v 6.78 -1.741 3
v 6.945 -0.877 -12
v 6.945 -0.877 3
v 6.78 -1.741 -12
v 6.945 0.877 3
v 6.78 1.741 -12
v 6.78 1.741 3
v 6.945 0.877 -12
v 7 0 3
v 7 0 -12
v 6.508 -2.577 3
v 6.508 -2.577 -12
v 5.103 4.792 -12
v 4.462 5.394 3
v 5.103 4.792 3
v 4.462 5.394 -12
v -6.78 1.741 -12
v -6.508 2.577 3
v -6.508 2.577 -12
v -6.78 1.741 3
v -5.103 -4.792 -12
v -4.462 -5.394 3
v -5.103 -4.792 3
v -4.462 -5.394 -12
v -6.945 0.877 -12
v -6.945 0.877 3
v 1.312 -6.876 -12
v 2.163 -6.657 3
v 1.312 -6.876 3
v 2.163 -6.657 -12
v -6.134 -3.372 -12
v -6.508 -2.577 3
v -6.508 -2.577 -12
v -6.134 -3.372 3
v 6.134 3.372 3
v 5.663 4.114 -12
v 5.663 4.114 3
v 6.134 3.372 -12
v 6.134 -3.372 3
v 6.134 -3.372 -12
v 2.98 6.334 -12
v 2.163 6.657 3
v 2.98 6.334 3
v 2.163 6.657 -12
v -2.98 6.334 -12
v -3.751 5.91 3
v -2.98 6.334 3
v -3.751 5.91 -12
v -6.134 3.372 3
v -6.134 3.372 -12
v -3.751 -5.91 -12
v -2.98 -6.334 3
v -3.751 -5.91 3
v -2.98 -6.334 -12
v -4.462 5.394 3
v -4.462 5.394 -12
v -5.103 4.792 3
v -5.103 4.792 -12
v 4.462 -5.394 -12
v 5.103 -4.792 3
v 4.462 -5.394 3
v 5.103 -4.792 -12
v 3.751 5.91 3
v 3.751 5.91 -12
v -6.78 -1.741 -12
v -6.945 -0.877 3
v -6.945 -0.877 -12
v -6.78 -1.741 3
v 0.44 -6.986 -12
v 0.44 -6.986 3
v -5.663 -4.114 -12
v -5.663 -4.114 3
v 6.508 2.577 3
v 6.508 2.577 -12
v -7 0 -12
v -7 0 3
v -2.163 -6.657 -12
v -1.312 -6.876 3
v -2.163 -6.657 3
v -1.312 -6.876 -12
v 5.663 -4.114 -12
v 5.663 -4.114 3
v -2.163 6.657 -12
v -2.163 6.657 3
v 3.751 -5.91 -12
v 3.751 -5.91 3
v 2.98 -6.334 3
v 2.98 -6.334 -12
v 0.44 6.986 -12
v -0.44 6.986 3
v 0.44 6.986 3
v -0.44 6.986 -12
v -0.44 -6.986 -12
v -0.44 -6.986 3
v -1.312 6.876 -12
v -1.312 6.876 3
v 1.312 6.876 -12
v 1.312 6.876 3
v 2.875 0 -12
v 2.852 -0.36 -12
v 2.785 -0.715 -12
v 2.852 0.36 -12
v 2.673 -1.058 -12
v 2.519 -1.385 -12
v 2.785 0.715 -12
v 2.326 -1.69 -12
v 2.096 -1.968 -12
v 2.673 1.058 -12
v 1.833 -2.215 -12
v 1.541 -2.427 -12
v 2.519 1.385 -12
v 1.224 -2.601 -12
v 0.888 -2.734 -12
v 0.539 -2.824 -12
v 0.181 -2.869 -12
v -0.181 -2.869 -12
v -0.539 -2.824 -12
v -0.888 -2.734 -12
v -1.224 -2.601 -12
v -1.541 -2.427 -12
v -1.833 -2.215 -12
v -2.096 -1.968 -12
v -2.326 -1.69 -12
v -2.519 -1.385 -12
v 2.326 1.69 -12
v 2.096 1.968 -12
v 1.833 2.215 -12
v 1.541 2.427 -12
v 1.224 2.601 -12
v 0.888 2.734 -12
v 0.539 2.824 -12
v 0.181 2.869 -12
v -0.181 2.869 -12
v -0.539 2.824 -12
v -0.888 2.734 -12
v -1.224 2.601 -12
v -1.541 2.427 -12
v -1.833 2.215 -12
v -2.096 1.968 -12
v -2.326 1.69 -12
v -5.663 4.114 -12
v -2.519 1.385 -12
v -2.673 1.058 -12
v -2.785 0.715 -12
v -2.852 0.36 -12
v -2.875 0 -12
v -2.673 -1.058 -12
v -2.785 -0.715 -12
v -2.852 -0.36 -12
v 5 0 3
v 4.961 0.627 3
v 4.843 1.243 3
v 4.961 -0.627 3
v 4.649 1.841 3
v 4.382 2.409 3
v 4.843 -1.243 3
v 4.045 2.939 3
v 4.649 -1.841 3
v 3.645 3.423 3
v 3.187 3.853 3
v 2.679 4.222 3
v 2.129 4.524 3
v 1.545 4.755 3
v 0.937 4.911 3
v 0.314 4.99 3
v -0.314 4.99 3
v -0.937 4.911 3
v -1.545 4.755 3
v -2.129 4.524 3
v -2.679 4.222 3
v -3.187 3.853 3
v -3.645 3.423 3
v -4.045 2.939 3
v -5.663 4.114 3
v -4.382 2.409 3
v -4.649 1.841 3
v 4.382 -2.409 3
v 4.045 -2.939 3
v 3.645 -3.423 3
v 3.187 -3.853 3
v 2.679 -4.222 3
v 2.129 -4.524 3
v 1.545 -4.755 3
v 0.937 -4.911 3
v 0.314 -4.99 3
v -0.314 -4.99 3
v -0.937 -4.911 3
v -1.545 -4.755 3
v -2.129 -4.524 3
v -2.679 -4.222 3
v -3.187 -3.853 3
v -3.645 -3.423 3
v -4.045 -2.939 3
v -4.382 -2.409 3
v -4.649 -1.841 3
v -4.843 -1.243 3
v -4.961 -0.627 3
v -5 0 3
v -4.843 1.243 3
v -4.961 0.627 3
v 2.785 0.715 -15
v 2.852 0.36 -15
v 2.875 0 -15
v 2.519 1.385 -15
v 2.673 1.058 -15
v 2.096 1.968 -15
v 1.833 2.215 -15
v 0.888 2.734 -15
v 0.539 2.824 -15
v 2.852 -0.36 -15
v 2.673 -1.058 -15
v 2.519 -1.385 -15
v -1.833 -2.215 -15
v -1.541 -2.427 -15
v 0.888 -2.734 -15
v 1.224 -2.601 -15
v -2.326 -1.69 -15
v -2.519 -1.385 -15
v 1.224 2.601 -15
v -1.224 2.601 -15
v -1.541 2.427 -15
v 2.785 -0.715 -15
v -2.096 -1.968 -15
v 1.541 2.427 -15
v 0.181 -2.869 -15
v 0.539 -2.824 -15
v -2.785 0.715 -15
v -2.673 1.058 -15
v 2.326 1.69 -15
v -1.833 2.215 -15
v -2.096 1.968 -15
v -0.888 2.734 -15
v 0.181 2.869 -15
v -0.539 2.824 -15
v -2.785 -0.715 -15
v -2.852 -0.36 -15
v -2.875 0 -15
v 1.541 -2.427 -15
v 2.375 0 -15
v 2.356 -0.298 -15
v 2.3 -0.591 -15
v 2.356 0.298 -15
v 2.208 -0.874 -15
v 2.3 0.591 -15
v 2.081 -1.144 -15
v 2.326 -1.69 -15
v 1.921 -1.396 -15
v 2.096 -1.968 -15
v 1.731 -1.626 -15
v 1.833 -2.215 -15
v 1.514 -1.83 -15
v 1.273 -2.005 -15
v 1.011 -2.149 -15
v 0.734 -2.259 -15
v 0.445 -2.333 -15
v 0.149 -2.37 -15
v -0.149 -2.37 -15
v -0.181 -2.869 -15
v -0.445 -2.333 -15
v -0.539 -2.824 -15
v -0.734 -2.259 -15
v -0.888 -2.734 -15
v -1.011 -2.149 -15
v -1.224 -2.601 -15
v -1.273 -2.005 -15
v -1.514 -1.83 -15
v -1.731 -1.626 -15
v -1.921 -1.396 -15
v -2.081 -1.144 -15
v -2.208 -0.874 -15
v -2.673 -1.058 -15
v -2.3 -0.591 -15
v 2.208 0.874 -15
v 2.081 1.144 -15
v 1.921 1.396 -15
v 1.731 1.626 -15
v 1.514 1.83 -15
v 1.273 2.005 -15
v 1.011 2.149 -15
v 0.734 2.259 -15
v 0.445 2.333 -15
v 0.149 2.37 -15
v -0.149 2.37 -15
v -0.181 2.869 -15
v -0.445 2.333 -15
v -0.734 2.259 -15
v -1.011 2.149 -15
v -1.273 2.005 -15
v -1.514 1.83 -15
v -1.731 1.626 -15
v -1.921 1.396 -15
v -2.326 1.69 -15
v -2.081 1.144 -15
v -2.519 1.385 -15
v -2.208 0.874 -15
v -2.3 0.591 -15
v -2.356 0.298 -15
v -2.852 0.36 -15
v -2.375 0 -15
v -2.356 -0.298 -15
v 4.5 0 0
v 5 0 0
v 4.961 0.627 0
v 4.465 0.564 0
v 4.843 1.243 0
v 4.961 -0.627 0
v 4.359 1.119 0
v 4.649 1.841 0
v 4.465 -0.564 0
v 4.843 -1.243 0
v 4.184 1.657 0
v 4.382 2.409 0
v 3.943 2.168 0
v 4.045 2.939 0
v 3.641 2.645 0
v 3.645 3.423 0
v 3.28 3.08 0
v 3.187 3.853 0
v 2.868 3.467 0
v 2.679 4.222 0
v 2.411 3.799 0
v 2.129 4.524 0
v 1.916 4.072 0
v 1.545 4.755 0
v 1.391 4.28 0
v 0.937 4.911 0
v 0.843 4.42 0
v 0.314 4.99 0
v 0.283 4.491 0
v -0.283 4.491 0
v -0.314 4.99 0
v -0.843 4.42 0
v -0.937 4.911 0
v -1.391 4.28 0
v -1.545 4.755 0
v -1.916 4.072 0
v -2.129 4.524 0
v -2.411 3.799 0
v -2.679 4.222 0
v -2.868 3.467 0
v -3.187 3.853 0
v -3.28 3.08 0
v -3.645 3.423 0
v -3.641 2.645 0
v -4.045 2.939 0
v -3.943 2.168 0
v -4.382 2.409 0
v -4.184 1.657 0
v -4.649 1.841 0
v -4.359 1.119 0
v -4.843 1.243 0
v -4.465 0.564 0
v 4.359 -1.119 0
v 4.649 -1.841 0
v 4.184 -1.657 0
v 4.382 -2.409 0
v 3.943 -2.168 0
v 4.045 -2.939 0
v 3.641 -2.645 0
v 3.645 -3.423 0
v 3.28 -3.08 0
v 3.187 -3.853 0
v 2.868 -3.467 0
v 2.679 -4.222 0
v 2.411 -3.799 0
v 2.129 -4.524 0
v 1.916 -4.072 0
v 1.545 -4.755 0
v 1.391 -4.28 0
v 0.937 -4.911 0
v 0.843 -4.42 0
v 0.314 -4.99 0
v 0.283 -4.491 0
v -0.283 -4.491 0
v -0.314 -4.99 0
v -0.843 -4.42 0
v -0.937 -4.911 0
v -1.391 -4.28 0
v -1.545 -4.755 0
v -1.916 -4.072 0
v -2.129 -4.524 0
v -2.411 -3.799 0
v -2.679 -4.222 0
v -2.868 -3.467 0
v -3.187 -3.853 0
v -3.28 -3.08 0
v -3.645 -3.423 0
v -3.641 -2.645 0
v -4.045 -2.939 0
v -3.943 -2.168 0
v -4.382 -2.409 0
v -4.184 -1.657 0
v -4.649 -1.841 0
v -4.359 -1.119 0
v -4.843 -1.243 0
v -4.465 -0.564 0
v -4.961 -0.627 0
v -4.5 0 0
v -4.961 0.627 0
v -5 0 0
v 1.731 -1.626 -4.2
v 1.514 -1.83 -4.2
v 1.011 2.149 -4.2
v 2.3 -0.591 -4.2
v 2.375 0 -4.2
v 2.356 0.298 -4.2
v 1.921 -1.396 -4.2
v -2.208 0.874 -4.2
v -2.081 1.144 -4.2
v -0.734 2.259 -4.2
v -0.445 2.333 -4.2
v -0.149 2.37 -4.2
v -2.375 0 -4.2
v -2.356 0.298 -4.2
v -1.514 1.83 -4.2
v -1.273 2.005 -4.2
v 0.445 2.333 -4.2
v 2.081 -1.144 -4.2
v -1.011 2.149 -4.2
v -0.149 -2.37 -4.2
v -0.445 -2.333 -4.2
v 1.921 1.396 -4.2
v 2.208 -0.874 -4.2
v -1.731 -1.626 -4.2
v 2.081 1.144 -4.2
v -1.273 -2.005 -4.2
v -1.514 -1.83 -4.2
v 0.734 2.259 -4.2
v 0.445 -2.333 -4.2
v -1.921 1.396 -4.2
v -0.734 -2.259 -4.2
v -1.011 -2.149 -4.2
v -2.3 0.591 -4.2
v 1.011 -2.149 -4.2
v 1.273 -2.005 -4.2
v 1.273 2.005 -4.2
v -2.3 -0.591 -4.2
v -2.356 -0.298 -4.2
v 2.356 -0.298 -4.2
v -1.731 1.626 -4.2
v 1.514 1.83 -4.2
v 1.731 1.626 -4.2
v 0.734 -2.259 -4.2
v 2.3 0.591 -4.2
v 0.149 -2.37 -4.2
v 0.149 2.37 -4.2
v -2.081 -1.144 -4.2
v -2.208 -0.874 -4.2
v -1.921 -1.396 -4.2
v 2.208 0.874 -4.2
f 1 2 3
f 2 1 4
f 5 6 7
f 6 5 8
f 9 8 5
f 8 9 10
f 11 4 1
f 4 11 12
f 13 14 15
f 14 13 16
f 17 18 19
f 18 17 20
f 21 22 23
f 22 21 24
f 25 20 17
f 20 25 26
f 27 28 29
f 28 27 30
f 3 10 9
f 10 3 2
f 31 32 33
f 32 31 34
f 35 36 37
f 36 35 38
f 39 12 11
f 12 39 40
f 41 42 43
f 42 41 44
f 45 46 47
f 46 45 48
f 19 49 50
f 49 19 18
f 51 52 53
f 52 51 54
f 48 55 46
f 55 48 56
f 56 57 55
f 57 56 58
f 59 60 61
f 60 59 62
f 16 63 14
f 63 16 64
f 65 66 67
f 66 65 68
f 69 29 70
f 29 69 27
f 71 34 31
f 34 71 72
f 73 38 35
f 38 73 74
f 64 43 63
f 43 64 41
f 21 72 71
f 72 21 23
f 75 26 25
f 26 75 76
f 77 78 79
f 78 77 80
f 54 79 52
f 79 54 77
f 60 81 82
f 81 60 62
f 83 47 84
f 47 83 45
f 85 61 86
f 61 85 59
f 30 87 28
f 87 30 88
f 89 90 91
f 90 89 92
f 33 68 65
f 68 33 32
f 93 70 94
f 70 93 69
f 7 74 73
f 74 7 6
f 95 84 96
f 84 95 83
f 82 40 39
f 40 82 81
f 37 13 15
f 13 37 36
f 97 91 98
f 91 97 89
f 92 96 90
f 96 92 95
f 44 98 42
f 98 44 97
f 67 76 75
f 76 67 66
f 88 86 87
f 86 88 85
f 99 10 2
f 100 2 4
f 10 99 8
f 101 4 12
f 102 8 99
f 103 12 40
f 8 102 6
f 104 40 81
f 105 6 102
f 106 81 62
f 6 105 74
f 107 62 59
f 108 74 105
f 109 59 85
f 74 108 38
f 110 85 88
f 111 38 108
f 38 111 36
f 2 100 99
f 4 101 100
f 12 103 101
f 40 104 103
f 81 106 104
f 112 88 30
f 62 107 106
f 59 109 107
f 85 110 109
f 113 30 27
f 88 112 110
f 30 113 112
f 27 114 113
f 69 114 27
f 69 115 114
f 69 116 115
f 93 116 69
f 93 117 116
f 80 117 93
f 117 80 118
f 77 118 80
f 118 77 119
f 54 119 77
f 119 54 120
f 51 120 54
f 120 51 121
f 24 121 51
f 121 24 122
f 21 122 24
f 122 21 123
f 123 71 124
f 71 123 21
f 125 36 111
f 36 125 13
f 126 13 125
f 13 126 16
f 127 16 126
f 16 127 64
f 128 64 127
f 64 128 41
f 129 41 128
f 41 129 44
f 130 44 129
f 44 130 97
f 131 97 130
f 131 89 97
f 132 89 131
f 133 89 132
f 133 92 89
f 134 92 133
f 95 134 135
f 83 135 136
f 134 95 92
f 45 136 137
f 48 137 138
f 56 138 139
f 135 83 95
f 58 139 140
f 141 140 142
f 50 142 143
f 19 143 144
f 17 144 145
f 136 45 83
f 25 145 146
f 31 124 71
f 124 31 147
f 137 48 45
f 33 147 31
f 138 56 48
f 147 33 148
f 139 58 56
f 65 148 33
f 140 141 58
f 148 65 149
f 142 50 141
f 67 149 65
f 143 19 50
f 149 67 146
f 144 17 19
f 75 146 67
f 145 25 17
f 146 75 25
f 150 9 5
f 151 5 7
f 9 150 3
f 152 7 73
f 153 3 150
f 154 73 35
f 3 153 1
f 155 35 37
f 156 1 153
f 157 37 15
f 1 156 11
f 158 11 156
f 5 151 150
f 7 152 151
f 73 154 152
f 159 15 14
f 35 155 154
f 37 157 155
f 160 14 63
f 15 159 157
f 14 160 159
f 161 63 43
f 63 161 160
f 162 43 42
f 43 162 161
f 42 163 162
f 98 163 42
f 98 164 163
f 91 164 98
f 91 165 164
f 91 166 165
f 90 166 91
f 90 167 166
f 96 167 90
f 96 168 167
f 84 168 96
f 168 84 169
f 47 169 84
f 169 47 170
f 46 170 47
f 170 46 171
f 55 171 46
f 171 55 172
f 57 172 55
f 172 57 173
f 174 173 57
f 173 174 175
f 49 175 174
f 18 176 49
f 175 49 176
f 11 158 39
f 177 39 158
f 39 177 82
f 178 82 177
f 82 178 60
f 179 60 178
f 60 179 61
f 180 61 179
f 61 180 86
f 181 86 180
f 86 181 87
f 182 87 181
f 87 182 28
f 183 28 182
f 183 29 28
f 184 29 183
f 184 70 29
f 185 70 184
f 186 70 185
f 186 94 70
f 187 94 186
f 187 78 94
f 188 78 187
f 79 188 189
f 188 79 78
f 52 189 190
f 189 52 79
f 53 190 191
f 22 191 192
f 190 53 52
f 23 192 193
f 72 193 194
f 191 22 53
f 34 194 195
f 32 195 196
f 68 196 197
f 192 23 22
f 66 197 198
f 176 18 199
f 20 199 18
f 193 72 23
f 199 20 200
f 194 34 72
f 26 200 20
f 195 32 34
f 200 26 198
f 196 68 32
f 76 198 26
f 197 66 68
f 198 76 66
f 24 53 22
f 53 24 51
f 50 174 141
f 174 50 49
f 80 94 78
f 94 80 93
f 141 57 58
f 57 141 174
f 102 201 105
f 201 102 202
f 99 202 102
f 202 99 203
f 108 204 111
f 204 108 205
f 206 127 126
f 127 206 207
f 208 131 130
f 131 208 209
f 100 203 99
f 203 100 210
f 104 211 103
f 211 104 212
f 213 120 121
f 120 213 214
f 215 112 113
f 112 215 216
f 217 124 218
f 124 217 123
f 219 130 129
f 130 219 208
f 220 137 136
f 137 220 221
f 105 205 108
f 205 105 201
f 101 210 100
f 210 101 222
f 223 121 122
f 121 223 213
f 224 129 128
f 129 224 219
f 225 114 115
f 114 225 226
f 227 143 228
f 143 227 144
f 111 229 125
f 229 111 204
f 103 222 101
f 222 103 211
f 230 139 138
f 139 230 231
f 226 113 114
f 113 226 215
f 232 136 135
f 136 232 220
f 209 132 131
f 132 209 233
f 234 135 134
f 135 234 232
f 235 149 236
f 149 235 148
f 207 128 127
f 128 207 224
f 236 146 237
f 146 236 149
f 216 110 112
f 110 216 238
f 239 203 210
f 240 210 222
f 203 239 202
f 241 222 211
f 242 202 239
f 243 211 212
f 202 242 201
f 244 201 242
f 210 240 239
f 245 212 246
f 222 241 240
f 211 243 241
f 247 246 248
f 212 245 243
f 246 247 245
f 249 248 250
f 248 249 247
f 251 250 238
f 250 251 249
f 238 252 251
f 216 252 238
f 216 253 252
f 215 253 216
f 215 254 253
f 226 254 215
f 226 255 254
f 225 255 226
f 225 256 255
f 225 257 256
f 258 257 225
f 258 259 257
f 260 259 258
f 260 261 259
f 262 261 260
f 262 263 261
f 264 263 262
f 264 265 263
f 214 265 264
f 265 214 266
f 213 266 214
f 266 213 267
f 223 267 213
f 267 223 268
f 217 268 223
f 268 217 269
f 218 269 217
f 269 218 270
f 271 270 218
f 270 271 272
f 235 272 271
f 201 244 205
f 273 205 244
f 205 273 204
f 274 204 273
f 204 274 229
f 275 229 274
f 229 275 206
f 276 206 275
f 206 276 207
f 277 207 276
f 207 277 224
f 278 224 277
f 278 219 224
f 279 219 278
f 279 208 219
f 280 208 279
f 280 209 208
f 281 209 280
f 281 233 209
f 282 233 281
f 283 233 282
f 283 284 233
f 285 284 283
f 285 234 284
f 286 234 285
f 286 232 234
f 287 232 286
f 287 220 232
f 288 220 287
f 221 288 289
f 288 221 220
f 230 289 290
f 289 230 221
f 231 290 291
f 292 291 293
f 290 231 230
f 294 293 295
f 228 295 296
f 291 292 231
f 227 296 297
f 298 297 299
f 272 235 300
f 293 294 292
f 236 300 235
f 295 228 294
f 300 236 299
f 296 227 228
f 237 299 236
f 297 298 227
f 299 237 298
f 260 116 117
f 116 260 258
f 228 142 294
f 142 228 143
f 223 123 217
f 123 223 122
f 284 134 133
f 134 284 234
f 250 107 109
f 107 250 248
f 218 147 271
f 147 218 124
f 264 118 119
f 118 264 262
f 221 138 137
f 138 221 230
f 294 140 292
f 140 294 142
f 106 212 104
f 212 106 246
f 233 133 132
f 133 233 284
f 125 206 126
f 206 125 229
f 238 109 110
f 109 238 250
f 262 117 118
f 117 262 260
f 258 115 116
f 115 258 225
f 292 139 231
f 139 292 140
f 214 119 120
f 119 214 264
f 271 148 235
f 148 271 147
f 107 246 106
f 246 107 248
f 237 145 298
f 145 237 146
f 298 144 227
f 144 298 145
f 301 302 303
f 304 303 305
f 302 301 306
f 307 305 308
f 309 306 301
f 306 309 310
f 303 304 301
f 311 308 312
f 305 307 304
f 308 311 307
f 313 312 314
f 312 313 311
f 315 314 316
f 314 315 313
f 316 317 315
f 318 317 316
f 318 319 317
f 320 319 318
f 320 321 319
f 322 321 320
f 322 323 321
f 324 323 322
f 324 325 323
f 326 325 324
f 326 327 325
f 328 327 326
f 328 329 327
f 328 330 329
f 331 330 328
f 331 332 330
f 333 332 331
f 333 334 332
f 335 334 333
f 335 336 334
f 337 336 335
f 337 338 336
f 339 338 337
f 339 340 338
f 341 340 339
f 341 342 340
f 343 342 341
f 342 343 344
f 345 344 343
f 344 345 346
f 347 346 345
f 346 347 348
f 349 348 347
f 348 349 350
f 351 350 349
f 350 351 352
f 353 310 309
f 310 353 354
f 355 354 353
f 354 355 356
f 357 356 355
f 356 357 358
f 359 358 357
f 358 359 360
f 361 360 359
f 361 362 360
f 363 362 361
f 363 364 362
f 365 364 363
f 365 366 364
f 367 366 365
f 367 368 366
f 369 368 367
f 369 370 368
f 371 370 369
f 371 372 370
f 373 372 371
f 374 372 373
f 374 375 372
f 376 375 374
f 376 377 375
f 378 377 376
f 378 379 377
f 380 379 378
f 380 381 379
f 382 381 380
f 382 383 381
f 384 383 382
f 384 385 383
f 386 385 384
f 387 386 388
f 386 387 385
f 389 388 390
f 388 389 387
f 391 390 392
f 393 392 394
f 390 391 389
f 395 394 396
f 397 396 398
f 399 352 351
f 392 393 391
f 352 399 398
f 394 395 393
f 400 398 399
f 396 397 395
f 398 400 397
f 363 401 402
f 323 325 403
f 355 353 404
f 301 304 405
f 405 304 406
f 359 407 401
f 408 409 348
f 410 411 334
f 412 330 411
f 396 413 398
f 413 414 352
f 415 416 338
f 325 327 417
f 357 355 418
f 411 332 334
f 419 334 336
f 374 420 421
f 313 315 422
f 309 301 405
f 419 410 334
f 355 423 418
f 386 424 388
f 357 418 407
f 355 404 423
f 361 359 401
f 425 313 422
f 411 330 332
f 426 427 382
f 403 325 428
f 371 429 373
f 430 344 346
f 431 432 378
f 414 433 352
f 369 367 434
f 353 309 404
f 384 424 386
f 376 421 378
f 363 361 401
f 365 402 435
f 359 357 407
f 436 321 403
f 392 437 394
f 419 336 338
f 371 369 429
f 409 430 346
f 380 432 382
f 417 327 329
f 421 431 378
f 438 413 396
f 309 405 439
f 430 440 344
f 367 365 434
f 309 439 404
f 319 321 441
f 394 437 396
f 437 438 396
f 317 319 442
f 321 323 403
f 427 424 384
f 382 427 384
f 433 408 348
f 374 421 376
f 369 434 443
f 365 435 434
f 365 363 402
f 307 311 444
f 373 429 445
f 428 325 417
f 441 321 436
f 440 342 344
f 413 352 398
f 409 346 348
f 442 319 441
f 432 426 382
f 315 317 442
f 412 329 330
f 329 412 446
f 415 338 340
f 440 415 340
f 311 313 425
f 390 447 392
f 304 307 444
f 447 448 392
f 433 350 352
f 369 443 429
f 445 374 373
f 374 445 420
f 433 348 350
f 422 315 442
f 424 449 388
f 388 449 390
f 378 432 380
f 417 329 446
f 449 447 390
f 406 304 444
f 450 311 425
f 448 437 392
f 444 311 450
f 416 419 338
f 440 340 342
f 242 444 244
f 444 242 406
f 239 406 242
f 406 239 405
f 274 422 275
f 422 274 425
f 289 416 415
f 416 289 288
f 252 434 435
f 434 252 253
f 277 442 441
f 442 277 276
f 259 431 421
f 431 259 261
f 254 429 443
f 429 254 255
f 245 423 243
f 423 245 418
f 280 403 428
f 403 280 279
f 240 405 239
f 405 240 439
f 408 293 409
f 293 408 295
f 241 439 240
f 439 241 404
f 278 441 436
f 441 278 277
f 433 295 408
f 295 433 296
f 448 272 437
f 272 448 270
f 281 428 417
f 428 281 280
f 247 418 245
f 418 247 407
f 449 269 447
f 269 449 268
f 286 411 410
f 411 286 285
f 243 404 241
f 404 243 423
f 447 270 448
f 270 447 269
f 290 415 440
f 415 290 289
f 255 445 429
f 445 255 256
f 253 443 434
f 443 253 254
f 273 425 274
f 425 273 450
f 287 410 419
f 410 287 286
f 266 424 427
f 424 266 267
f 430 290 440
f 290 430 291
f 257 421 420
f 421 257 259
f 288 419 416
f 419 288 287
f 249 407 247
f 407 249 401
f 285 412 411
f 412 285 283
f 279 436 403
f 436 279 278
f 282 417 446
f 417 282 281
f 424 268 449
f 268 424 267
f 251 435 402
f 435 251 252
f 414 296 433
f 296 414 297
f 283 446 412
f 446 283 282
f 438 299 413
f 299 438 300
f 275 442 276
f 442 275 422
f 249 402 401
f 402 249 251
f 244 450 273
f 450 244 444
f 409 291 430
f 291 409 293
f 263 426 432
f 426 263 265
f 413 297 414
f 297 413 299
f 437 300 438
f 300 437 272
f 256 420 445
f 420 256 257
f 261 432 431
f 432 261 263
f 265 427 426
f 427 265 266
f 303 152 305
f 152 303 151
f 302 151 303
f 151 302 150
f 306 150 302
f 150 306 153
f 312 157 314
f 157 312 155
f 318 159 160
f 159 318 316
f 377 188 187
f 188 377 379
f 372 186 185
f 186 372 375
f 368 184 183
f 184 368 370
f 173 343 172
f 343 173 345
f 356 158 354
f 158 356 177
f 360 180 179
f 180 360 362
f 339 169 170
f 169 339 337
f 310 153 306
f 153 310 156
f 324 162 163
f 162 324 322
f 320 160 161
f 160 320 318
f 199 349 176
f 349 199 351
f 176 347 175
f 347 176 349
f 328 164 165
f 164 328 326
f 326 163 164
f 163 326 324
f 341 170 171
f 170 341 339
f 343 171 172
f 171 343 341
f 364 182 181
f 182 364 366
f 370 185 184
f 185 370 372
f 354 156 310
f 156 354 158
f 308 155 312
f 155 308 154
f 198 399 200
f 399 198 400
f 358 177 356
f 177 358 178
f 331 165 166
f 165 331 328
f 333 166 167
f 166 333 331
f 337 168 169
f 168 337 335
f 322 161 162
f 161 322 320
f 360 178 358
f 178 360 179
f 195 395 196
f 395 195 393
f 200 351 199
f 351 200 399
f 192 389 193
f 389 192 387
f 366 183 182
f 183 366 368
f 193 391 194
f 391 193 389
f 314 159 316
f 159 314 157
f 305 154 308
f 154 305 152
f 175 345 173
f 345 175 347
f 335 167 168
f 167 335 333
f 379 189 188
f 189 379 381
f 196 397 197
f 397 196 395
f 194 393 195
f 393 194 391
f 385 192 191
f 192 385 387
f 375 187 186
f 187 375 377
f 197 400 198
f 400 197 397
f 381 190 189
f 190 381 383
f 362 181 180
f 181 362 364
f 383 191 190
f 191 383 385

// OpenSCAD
$fn = 50;


difference() {
	union() {
		translate(v = [0, 0, -12.0000000000]) {
			cylinder(h = 15, r = 7.0000000000);
		}
		#translate(v = [0, 0, -15.0000000000]) {
			cylinder(h = 15, r = 2.8750000000);
		}
	}
	union() {
		translate(v = [0, 0, 0]) {
			rotate(a = [0, 0, 0]) {
				difference() {
					union() {
						translate(v = [0, 0, -15.0000000000]) {
							cylinder(h = 15, r = 2.2500000000);
						}
						translate(v = [0, 0, -4.2000000000]) {
							cylinder(h = 4.2000000000, r1 = 2.3750000000, r2 = 4.5000000000);
						}
						translate(v = [0, 0, -15.0000000000]) {
							cylinder(h = 15, r = 2.3750000000);
						}
						translate(v = [0, 0, -15.0000000000]) {
							cylinder(h = 15, r = 2.2500000000);
						}
					}
					union();
				}
			}
		}
		#cylinder(h = 3, r = 5.0000000000);
	}
}
